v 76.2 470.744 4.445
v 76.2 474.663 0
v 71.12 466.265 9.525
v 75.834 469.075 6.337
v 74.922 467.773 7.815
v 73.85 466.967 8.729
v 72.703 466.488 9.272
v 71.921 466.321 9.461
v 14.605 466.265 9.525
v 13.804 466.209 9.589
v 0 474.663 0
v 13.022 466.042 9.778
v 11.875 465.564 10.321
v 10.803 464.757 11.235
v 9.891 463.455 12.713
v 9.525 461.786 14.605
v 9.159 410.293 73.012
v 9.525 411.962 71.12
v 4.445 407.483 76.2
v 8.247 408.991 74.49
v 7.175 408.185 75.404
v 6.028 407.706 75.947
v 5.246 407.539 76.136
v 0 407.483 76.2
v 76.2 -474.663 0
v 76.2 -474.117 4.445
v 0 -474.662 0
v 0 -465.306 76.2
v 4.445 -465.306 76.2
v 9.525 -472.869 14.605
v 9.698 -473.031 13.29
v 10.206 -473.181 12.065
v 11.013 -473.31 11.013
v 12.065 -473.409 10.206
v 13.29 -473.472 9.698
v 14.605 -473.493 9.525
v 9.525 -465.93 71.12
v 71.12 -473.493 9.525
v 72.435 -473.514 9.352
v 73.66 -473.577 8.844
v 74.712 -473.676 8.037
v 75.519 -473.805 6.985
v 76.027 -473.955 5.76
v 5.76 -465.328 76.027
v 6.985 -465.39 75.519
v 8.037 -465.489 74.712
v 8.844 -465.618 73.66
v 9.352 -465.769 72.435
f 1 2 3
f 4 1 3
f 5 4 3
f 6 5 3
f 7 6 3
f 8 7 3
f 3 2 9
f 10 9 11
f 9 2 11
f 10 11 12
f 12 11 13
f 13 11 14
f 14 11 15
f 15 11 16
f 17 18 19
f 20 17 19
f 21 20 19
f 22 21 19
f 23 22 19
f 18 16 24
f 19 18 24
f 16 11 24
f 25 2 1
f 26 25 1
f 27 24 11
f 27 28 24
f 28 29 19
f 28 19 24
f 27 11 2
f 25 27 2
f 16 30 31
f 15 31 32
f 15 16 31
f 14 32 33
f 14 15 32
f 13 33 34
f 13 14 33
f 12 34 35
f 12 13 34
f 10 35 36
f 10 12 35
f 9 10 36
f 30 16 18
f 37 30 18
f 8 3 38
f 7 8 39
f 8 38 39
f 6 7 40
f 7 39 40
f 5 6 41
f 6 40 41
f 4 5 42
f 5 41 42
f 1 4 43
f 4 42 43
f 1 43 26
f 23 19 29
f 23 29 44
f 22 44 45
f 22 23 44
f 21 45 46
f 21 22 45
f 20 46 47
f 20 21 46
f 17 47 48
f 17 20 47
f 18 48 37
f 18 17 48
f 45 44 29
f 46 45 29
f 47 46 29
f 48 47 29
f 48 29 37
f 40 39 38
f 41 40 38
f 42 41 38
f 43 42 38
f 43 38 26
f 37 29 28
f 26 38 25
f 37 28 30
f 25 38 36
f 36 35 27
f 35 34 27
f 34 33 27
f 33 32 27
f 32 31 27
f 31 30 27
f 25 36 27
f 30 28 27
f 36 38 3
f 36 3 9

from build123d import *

# Parameters (mm, degrees)
F1_DEPTH = 474.6625
F2_R     = 5.08
F4_DEPTH = 76.2
F5_DEPTH = 76.2


with BuildPart() as f1:
    # F0 (on Front) → F1 (new body, symmetric)
    with BuildSketch(Plane.XZ):
        Polygon((0, 76.2), (0, 0), (76.2, 0), (76.2, 9.525), (9.525, 9.525), (9.525, 76.2), align=None)
    extrude(amount=F1_DEPTH, both=True)

    # F2
    f2_edges = [f1.edges().sort_by_distance(p)[0] for p in [
        (9.525, 0, 76.2),
        (9.525, 0, 9.525),
        (76.2, 0, 9.525),
    ]]
    fillet(f2_edges, radius=F2_R)

    # F3 (on face) → F4 (cut)
    with BuildSketch(Plane(origin=(0, 0, 0), x_dir=(0, -1, 0), z_dir=(-1, 0, 0))):
        Polygon((-474.6625, 76.2), (-474.6625, 0), (-407.483163, 76.2), align=None)
        Polygon((465.306316, 76.2), (474.6625, 0), (474.6625, 76.2), align=None)
    extrude(amount=-F4_DEPTH, mode=Mode.SUBTRACT)

    # F3 (on face) → F5 (cut)
    with BuildSketch(Plane(origin=(0, 0, 0), x_dir=(0, -1, 0), z_dir=(-1, 0, 0))):
        Polygon((-474.6625, 76.2), (-474.6625, 0), (-407.483163, 76.2), align=None)
        Polygon((465.306316, 76.2), (474.6625, 0), (474.6625, 76.2), align=None)
    extrude(amount=-F5_DEPTH, mode=Mode.SUBTRACT)


solid = f1.part
